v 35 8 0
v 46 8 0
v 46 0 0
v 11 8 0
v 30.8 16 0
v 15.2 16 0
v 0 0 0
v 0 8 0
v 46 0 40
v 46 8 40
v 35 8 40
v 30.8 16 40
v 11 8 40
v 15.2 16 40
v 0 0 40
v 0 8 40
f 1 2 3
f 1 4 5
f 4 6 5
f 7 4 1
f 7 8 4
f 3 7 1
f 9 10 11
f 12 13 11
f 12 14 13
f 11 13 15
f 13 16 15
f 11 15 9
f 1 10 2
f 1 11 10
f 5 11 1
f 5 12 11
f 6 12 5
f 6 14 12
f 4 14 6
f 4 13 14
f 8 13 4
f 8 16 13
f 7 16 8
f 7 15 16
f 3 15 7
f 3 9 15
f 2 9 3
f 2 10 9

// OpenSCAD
$fn = 32;

// ----------------------------------------------------------------------
// V guide rail: dovetail, 46 mm wide
// ----------------------------------------------------------------------

// --- parameters (mm) ---
rail_w = 46;              // rail width, X
base_t = 8;               // base plate thickness
v_depth = 8;              // V feature depth / height
v_half_w = 12;            // half width of the V at the base face
plate_t = 40;             // rail length, Z (the extrusion height)
top_half_w = 7.8;         // half width at the dovetail top

dovetail_base = 2 * v_half_w;  // dovetail width at the base
dovetail_top = 2 * top_half_w;  // dovetail width at the top

profile = [[0, 0], [46, 0], [46, 8], [35, 8], [30.8, 16], [15.2, 16], [11, 8], [0, 8]];  // primary outline, 8 points, counter clockwise

// --- the one profile operation ---
linear_extrude(height = plate_t) polygon(points = profile);
